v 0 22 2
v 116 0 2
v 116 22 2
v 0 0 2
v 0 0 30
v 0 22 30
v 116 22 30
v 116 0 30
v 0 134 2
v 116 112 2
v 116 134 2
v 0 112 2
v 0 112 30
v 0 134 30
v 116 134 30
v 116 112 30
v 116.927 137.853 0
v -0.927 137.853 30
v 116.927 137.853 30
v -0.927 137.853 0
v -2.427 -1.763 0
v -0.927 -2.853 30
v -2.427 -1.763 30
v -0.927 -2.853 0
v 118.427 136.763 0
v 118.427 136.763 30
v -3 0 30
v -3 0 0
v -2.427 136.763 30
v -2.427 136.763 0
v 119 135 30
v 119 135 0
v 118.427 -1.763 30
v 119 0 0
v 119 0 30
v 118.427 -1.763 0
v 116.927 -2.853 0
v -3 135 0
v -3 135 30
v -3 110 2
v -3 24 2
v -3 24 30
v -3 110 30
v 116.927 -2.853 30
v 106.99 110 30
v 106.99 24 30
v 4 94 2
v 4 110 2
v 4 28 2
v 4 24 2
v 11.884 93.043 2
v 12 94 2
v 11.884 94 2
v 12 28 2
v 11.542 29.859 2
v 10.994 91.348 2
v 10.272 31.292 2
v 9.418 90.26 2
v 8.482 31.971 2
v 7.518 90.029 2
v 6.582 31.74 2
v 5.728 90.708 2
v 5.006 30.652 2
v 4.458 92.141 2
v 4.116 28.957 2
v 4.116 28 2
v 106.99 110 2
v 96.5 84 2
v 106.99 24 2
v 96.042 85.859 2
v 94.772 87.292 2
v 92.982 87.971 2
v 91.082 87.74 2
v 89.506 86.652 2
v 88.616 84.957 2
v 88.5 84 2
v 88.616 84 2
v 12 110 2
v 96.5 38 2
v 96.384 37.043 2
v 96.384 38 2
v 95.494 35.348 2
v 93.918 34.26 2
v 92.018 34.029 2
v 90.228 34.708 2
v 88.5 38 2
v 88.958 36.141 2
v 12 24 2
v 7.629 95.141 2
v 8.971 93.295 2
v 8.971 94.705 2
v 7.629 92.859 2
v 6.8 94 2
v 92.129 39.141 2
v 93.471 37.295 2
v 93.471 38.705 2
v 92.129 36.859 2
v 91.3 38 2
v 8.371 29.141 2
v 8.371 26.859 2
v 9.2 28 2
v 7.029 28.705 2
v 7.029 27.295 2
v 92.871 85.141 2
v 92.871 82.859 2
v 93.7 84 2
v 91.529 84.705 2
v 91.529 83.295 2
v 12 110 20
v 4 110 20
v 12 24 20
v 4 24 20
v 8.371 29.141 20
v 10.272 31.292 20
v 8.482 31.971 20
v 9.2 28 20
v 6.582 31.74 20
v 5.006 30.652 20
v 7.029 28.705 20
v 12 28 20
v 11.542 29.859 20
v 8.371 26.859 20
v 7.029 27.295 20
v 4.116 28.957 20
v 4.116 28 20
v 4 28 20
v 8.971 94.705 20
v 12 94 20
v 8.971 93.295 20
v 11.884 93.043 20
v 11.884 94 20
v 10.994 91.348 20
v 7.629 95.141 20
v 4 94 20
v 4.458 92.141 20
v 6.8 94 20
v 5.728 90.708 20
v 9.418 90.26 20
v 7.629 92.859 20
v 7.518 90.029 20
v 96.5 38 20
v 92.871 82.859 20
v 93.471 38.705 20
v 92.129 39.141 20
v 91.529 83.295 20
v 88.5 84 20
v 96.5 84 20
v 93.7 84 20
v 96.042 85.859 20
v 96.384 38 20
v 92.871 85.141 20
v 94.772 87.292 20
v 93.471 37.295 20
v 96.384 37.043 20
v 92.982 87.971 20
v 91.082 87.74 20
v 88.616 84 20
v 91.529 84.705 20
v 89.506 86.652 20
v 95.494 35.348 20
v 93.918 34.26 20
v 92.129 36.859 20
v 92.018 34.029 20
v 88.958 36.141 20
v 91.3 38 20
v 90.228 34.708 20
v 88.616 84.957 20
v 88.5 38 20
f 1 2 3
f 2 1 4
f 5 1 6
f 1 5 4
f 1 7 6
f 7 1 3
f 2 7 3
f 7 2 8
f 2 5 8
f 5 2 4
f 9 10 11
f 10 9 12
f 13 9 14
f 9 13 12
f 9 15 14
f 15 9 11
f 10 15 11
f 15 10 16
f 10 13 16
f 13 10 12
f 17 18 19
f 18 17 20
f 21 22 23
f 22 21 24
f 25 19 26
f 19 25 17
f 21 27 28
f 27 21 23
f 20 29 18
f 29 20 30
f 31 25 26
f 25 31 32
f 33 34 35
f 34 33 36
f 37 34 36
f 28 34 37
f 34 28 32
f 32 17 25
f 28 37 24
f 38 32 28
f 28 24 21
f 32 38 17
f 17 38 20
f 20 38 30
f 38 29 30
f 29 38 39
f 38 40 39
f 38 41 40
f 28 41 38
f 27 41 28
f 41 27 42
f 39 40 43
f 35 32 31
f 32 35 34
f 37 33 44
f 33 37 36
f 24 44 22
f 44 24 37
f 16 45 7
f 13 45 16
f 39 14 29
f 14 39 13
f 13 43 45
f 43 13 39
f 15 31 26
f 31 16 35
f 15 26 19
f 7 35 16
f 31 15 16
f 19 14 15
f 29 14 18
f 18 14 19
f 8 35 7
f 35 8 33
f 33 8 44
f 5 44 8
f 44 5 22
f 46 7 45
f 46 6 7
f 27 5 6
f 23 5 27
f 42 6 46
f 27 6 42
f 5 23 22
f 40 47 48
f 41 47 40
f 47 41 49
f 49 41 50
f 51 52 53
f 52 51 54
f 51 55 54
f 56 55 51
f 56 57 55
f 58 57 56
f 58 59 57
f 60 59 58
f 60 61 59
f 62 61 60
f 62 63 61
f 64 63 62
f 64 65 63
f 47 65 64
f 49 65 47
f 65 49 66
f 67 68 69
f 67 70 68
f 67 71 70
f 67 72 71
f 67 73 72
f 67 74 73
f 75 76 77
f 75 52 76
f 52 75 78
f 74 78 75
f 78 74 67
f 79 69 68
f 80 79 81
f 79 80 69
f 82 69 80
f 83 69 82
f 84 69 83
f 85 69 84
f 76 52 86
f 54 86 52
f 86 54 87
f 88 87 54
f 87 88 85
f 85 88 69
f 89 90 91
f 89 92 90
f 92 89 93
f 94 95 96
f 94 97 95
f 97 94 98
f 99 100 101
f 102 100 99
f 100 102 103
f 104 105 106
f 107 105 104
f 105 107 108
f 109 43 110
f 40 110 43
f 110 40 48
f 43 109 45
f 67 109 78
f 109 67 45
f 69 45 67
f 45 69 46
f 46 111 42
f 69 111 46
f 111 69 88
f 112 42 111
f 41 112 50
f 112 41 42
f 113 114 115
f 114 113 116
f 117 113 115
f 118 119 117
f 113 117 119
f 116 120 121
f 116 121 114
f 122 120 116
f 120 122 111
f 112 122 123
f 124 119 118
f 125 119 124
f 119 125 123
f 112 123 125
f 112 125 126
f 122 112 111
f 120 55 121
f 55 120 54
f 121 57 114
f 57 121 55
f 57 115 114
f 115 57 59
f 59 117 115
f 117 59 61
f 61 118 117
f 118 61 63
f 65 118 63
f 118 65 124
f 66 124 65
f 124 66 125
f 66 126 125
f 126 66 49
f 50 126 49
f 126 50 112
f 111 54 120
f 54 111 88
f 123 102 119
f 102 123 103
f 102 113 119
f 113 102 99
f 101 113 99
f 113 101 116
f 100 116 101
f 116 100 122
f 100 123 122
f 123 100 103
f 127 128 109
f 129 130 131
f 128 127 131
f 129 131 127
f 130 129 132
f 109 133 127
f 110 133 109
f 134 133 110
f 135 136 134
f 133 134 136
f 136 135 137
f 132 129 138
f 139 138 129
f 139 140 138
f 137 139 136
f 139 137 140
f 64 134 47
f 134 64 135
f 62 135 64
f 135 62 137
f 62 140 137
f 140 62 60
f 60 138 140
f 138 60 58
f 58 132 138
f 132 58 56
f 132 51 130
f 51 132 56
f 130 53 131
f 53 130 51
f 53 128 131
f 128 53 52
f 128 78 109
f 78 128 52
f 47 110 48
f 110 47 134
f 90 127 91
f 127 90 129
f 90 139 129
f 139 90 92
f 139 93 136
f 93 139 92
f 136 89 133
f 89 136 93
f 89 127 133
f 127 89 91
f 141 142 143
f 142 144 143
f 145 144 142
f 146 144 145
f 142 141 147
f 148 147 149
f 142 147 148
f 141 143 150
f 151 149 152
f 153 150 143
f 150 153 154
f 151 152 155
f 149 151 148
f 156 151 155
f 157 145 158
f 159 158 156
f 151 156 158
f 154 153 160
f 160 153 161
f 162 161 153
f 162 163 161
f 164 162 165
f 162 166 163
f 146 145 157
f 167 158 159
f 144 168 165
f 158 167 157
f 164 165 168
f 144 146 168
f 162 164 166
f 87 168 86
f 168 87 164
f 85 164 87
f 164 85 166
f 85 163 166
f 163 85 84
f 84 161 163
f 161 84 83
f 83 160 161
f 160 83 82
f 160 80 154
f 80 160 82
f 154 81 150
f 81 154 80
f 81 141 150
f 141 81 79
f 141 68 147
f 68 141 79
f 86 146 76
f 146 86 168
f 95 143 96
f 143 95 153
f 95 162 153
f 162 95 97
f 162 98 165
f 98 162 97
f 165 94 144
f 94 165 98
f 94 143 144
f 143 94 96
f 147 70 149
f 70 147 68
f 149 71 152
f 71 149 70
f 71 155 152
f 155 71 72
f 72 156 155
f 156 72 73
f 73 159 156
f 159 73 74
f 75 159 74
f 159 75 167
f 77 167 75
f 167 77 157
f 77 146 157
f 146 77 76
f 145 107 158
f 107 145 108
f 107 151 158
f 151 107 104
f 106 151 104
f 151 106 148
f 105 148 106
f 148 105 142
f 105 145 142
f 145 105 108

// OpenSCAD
// file: ../rpi.scad
 // include <./RPi4board-modded.scad>;



// translate([5, 61, 5])
  // rotate([0, 0, 270])
   // board_raspberrypi_4_model_b();


// rpi4([2, 2, 2], [0, 0, 2]);


slop=0.01;
module rpi4(
  rpi_buffer, 
  rpi_padding,
  expose_card=false,
  expose_hdmi=false,
  expose_usb1=false,
  expose_usb2=false,
  expose_ribbon_cable=false,
  expose_gpio_pins=false,
  head_room=4
  )
{
  rpi_screws=[58, 49, 3];
  rpi_size=[88, 58, 13];

  difference() {
    gen_rpi(rpi_screws, rpi_size, rpi_buffer, rpi_padding, expose_card, expose_hdmi, expose_usb1,   expose_usb2, expose_ribbon_cable, expose_gpio_pins, head_room);
  
    // usb 1
    translate([92, 6, 5])
      cube([16, 16, 18]);

    // usb 2
    translate([92, 24, 5])
      cube([16, 16, 18]);

    // ethernet
    translate([92, 42, 5])
      cube([16, 18, 16]);

    // power
    translate([9, -slop, rpi_padding.z + rpi_buffer.z])
      cube([14, rpi_buffer.x + 2*slop, 7]);

    // hdmi
    translate([26.5, -slop, rpi_padding.z + rpi_buffer.z])
      cube([9, rpi_buffer.x + 2*slop, 5]);

    // hdm2
    translate([40, -slop, rpi_padding.z + rpi_buffer.z])
      cube([9, rpi_buffer.x + 2*slop, 5]);

  }
}

module rpi0(
  rpi_buffer, 
  rpi_padding,
  expose_card=false,
  expose_hdmi=false,
  expose_usb1=false,
  expose_usb2=false,
  expose_ribbon_cable=false,
  expose_gpio_pins=false,
  head_room=4
  )
{
  rpi_screws=[58, 23, 3];
  rpi_size=[65, 30, 3];

  gen_rpi(rpi_screws, rpi_size, rpi_buffer, rpi_padding, expose_card, expose_hdmi, expose_usb1, expose_usb2, expose_ribbon_cable, expose_gpio_pins, head_room);
  
  
  
}

module gen_rpi(
  rpi_screws, 
  rpi_size,
  
  rpi_buffer, 
  rpi_padding,
  expose_card=false,
  expose_hdmi=false,
  expose_usb1=false,
  expose_usb2=false,
  expose_ribbon_cable=false,
  expose_gpio_pins=false,
  head_room=4
  )
{
  rpi_envelope=rpi_size + [2, 2, 4];
  sdcard_allowance= expose_card ? 0 : 2;

  mezz_height= max( rpi_padding.z, 3);
  rpi_cutout = rpi_envelope + rpi_padding * 2 - [0, 0, rpi_padding.z];
  rpi_origin = rpi_buffer;
    
  difference()
  {
    union()
    {
      difference()
      {
        cube(rpi_cutout + rpi_buffer + [rpi_buffer.x + sdcard_allowance, rpi_buffer.y, head_room]);
        translate(rpi_origin + [0,0,0])
        cube(rpi_cutout + [0,0,rpi_padding.z + rpi_buffer.z + slop]);
      }
      
      translate(rpi_origin + [rpi_padding.x + 3, rpi_padding.y + 3, 0])
        screws(rpi_screws, mezz_height);
    }
    
    
    
    
    // graphics ribbon
    if (expose_ribbon_cable) {
      translate(rpi_buffer + [-rpi_buffer.x - slop, 7, rpi_buffer.z + rpi_padding.z])
      cube([rpi_buffer.x + rpi_padding.x + slop + slop, 17, rpi_cutout.z]);
    }

    // sd card slot
    if (expose_card) {
      translate(rpi_buffer + [rpi_envelope.x - slop - 1, 11, -rpi_buffer.z - slop])
      cube([rpi_buffer.x + 10 + sdcard_allowance, 15, rpi_cutout.z + rpi_buffer.z*3]);
    }

    if (expose_gpio_pins) {
      translate(rpi_buffer + rpi_padding + [7, -rpi_buffer.y -slop, 0])
      cube([rpi_buffer.x + 12 + 39, rpi_buffer.y + 1 + slop*2, rpi_cutout.z + slop]);
    }

    translate(rpi_buffer + [1, rpi_envelope.y - slop, rpi_buffer.z + rpi_padding.z - 1])
    {
      // usb slot
      if (expose_usb2) {
        translate([5, 0, 0])
        cube([11, rpi_buffer.y + slop*2, 8]);
      }
      // usb slot
      if (expose_usb1) {
        translate([19, 0, 0])
        cube([11, rpi_buffer.y + slop*2, 8]);
      }
      // hdmi
      if (expose_hdmi) {
        translate([44.6, 0, 0])
        cube([16, rpi_buffer.y + slop*2, 8]);
      }
    }
  }
}

module screws(rpi_screws, screw_height)
{
  screw_mount(screw_height, 0);

  translate([rpi_screws.x, 0, 0])
  screw_mount(screw_height, 90);

  translate([rpi_screws.x, rpi_screws.y, 0])
  screw_mount(screw_height, 180);

  translate([0, rpi_screws.y, 0])
  screw_mount(screw_height, 270);
}

module screw_mount(screw_mount_height, rotation)
{
  difference()
  {
    screw_diameter = 1.25;
    screw_mount_dia = 3.5;
    
    translate([screw_mount_dia/2 + 1.75, screw_mount_dia/2 + 1.75, 0])
    rotate(rotation)
    linear_extrude(screw_mount_height)
    hull() {
      mount_size = screw_mount_dia;
      circle(mount_size);
      polygon([[-mount_size, mount_size], [-mount_size,-mount_size], [mount_size,-mount_size]]);
    }
    translate([screw_mount_dia/2 + 1.75, screw_mount_dia/2 +  1.75, slop])
    cylinder(r = screw_diameter, h = screw_mount_height);
  }
}
// main file
use <../rpi.scad>;

expose_card=false;
expose_hdmi=false;
expose_usb1=true;
expose_usb2=false;
expose_ribbon_cable=false;
expose_gpio_pins=false;


module __Customizer_Limit__ () {}

base_width=116;
base_depth=135;
base_height=30;
floor_height=2;
corner_radius=3;
slop = 0.01;
post_height=18;

module chomp_stand()
{
  difference()
  {
    base();
    hd_bays();
    cpu_bay();
  }
  screw_posts();
}

module screw_posts()
{
    translate([8, 28, floor_height])
    screw_post();

    translate([8, 94, floor_height])
    rotate(180)
    screw_post();

    translate([4, 98, floor_height])
    linear_extrude(18)
   square([8,12]);

    translate([92.5, 38, floor_height])
    rotate(180)
    screw_post();

    translate([92.5, 84, floor_height])
    screw_post();
  
    translate([88.5, 40, floor_height])
    linear_extrude(18)
   square([8,42]);

}

module screw_post()
{
    linear_extrude(18)
  difference()
  {
    union()
  {
    circle(4);
    translate([-4, -4])
   square([8,4]);
  }
    circle(1.2);
}
}

module cpu_bay()
{
    translate([-corner_radius - slop, 24, floor_height])
    linear_extrude(60)
    square([110, 86]);
}

module base()
{
    linear_extrude(base_height)
    {
      hull() {
        circle(corner_radius);
        translate([base_width,0]) circle(corner_radius);
        translate([0,base_depth]) circle(corner_radius);
        translate([base_width,base_depth]) circle(corner_radius);
      }
    }
}

module hd_bays()
{
    translate([0, 0, floor_height])
    linear_extrude(60)
    square([116,22]);

    translate([0, 112, floor_height])
    linear_extrude(60)
    square([116,22]);

}

chomp_stand();
